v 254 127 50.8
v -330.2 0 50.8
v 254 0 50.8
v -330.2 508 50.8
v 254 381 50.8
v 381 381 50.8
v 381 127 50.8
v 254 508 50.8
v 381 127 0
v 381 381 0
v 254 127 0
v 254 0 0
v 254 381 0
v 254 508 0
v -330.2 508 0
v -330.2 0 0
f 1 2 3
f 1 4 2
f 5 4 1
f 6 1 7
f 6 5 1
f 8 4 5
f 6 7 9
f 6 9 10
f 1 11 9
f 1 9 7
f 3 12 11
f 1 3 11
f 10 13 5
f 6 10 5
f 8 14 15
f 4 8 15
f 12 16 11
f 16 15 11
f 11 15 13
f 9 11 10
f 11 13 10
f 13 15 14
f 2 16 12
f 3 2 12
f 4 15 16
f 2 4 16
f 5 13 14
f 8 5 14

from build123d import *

# Parameters (mm, degrees)
F1_DEPTH = 50.8
F2_W     = 254
F2_H     = 50.8
F3_DEPTH = 127


with BuildPart() as f1:
    # F0 (on Top) → F1 (new body)
    with BuildSketch(Plane.XY):
        Polygon((-330.2, 0), (0, 0), (254, 0), (254, 508), (0, 508), (-330.2, 508), align=None)
    extrude(amount=F1_DEPTH)

    # F2 (on face) → F3 (join)
    with BuildSketch(Plane.YZ.offset(254)):
        with Locations((254, 25.4)):
            Rectangle(F2_W, F2_H)
    extrude(amount=F3_DEPTH)


solid = f1.part
